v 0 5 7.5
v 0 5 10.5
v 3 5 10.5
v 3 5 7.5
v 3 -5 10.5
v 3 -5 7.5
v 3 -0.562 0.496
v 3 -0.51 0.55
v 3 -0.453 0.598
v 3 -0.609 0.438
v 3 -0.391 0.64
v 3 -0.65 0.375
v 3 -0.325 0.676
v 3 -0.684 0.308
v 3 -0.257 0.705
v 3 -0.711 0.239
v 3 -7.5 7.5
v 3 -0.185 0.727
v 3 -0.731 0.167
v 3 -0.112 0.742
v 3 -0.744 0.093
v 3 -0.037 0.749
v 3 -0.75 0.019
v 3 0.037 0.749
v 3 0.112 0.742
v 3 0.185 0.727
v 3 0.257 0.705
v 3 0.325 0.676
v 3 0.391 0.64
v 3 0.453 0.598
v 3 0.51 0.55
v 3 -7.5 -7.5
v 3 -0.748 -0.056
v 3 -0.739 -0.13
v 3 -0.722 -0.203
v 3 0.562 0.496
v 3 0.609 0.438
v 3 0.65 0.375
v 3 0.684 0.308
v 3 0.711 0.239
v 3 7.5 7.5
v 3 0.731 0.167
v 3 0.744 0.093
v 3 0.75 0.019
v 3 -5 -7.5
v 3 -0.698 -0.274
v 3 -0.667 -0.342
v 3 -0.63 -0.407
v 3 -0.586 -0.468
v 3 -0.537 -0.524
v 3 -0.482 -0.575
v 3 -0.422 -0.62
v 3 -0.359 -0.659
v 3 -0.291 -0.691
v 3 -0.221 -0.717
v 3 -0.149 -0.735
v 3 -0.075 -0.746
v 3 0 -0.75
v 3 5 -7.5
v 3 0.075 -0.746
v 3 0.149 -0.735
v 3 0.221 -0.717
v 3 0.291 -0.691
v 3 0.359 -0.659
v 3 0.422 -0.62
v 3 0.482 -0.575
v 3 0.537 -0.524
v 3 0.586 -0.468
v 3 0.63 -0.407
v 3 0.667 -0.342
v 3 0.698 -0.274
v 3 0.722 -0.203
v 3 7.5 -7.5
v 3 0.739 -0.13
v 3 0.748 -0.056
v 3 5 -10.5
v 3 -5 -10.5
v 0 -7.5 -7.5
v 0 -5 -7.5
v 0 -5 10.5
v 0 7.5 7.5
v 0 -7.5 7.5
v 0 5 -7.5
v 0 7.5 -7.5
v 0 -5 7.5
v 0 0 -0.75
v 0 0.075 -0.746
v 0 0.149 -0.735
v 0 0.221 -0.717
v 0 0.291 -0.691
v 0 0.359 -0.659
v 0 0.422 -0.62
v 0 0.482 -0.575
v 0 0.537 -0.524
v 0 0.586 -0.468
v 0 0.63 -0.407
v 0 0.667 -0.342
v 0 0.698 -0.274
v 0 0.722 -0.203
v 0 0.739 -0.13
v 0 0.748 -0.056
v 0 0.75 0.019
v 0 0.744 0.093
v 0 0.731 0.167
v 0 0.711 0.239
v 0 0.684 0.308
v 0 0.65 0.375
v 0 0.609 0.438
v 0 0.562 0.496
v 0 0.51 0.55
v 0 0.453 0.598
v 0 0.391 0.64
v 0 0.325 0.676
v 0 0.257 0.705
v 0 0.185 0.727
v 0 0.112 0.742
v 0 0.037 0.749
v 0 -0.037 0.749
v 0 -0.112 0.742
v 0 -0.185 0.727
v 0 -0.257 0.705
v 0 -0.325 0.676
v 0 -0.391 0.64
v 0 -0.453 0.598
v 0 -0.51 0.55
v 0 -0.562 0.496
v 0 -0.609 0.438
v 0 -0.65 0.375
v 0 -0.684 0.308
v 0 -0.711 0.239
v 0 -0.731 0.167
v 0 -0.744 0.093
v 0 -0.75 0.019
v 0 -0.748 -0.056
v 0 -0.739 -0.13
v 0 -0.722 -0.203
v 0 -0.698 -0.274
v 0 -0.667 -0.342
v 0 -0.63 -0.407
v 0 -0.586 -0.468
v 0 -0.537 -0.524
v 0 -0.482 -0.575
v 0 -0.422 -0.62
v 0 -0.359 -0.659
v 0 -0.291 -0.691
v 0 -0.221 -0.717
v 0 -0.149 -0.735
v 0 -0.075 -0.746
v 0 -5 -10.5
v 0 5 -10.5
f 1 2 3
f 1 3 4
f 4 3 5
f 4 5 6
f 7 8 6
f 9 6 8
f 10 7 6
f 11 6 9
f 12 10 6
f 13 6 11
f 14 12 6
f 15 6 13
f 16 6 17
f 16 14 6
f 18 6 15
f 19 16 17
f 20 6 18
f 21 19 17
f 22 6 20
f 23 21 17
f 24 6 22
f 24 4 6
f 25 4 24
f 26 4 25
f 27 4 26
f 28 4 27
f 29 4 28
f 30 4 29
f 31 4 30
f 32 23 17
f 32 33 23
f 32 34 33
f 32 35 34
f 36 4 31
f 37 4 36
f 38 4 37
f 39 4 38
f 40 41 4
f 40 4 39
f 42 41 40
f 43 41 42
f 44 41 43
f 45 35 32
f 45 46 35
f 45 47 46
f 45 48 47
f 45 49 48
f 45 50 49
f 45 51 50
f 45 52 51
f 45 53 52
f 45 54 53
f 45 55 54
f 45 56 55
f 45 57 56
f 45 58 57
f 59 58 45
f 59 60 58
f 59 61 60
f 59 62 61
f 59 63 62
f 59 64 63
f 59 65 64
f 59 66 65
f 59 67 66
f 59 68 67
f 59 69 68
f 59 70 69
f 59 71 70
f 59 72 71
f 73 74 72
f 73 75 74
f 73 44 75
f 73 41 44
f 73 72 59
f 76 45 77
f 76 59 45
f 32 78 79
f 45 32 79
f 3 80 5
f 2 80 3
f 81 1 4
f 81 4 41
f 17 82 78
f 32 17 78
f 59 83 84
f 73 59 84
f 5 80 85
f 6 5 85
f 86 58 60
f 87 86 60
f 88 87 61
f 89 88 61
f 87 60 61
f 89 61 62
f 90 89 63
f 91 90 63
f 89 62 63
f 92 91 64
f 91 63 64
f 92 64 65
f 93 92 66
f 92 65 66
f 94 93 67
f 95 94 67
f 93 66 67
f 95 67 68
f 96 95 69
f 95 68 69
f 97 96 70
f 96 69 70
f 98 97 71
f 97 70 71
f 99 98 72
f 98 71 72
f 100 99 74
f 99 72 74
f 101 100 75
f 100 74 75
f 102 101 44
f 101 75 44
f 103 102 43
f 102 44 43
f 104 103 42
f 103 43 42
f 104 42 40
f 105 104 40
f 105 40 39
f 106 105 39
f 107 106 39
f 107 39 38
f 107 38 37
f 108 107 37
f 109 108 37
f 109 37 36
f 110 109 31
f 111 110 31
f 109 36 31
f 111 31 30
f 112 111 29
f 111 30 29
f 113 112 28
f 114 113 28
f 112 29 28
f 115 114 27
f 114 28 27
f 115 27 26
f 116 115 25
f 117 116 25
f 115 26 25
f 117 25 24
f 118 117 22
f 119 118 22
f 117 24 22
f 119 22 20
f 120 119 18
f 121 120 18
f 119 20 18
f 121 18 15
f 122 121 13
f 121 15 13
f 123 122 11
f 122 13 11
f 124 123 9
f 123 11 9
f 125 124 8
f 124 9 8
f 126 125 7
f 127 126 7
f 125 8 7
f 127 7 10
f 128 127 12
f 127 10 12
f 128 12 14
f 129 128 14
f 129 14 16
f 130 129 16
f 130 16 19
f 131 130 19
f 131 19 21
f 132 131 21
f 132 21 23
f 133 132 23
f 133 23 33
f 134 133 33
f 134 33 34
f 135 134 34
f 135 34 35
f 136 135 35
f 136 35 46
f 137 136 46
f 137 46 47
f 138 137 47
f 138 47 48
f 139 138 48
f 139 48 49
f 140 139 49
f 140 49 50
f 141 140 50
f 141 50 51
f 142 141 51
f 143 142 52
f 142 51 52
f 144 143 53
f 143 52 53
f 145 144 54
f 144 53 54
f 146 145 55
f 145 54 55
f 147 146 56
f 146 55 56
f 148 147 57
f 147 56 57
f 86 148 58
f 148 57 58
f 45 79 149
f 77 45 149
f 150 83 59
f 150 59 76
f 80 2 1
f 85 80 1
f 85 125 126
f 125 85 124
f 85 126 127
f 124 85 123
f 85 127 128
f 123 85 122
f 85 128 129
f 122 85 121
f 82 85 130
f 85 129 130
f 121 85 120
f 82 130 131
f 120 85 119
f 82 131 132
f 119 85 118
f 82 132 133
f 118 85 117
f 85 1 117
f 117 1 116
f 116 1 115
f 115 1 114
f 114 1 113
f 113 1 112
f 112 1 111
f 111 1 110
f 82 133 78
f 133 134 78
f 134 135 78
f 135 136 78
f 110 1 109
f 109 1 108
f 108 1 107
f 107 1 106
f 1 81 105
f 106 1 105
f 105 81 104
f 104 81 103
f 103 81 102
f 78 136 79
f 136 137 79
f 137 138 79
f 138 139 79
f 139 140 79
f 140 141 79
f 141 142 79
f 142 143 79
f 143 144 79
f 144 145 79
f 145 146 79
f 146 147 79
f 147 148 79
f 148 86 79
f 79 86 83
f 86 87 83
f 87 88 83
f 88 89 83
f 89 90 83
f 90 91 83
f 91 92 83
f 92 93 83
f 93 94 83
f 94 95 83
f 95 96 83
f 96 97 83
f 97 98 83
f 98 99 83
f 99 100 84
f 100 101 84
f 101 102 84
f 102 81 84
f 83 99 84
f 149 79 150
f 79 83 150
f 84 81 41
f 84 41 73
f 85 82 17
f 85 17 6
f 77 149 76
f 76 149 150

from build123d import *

# Parameters (mm, degrees)
SKICA1_W                 = 3
SKICA1_H                 = 10
SKICA1_W_2               = 15
SKICA1_H_2               = 15
P_IDAT_VYSUNUT_M1_DEPTH  = 3
SKICA2_R                 = 0.75
ODEBRAT_VYSUNUT_M1_DEPTH = 3


with BuildPart() as part:
    # Skica1 → Přidat vysunutím1 (new body)
    with BuildSketch(Plane(origin=(0, 0, 0), x_dir=(0, 0, -1), z_dir=(1, 0, 0))):
        with Locations((9, 0)):
            Rectangle(SKICA1_W, SKICA1_H)
        Rectangle(SKICA1_W_2, SKICA1_H_2)
        with Locations((-9, 0)):
            Rectangle(SKICA1_W, SKICA1_H)
    extrude(amount=P_IDAT_VYSUNUT_M1_DEPTH)

    # Skica2 → Odebrat vysunutím1 (cut)
    with BuildSketch(Plane(origin=(3, 0, 0), x_dir=(0, 0, -1), z_dir=(1, 0, 0))):
        Circle(SKICA2_R)
    extrude(amount=-ODEBRAT_VYSUNUT_M1_DEPTH, mode=Mode.SUBTRACT)


solid = part.part
